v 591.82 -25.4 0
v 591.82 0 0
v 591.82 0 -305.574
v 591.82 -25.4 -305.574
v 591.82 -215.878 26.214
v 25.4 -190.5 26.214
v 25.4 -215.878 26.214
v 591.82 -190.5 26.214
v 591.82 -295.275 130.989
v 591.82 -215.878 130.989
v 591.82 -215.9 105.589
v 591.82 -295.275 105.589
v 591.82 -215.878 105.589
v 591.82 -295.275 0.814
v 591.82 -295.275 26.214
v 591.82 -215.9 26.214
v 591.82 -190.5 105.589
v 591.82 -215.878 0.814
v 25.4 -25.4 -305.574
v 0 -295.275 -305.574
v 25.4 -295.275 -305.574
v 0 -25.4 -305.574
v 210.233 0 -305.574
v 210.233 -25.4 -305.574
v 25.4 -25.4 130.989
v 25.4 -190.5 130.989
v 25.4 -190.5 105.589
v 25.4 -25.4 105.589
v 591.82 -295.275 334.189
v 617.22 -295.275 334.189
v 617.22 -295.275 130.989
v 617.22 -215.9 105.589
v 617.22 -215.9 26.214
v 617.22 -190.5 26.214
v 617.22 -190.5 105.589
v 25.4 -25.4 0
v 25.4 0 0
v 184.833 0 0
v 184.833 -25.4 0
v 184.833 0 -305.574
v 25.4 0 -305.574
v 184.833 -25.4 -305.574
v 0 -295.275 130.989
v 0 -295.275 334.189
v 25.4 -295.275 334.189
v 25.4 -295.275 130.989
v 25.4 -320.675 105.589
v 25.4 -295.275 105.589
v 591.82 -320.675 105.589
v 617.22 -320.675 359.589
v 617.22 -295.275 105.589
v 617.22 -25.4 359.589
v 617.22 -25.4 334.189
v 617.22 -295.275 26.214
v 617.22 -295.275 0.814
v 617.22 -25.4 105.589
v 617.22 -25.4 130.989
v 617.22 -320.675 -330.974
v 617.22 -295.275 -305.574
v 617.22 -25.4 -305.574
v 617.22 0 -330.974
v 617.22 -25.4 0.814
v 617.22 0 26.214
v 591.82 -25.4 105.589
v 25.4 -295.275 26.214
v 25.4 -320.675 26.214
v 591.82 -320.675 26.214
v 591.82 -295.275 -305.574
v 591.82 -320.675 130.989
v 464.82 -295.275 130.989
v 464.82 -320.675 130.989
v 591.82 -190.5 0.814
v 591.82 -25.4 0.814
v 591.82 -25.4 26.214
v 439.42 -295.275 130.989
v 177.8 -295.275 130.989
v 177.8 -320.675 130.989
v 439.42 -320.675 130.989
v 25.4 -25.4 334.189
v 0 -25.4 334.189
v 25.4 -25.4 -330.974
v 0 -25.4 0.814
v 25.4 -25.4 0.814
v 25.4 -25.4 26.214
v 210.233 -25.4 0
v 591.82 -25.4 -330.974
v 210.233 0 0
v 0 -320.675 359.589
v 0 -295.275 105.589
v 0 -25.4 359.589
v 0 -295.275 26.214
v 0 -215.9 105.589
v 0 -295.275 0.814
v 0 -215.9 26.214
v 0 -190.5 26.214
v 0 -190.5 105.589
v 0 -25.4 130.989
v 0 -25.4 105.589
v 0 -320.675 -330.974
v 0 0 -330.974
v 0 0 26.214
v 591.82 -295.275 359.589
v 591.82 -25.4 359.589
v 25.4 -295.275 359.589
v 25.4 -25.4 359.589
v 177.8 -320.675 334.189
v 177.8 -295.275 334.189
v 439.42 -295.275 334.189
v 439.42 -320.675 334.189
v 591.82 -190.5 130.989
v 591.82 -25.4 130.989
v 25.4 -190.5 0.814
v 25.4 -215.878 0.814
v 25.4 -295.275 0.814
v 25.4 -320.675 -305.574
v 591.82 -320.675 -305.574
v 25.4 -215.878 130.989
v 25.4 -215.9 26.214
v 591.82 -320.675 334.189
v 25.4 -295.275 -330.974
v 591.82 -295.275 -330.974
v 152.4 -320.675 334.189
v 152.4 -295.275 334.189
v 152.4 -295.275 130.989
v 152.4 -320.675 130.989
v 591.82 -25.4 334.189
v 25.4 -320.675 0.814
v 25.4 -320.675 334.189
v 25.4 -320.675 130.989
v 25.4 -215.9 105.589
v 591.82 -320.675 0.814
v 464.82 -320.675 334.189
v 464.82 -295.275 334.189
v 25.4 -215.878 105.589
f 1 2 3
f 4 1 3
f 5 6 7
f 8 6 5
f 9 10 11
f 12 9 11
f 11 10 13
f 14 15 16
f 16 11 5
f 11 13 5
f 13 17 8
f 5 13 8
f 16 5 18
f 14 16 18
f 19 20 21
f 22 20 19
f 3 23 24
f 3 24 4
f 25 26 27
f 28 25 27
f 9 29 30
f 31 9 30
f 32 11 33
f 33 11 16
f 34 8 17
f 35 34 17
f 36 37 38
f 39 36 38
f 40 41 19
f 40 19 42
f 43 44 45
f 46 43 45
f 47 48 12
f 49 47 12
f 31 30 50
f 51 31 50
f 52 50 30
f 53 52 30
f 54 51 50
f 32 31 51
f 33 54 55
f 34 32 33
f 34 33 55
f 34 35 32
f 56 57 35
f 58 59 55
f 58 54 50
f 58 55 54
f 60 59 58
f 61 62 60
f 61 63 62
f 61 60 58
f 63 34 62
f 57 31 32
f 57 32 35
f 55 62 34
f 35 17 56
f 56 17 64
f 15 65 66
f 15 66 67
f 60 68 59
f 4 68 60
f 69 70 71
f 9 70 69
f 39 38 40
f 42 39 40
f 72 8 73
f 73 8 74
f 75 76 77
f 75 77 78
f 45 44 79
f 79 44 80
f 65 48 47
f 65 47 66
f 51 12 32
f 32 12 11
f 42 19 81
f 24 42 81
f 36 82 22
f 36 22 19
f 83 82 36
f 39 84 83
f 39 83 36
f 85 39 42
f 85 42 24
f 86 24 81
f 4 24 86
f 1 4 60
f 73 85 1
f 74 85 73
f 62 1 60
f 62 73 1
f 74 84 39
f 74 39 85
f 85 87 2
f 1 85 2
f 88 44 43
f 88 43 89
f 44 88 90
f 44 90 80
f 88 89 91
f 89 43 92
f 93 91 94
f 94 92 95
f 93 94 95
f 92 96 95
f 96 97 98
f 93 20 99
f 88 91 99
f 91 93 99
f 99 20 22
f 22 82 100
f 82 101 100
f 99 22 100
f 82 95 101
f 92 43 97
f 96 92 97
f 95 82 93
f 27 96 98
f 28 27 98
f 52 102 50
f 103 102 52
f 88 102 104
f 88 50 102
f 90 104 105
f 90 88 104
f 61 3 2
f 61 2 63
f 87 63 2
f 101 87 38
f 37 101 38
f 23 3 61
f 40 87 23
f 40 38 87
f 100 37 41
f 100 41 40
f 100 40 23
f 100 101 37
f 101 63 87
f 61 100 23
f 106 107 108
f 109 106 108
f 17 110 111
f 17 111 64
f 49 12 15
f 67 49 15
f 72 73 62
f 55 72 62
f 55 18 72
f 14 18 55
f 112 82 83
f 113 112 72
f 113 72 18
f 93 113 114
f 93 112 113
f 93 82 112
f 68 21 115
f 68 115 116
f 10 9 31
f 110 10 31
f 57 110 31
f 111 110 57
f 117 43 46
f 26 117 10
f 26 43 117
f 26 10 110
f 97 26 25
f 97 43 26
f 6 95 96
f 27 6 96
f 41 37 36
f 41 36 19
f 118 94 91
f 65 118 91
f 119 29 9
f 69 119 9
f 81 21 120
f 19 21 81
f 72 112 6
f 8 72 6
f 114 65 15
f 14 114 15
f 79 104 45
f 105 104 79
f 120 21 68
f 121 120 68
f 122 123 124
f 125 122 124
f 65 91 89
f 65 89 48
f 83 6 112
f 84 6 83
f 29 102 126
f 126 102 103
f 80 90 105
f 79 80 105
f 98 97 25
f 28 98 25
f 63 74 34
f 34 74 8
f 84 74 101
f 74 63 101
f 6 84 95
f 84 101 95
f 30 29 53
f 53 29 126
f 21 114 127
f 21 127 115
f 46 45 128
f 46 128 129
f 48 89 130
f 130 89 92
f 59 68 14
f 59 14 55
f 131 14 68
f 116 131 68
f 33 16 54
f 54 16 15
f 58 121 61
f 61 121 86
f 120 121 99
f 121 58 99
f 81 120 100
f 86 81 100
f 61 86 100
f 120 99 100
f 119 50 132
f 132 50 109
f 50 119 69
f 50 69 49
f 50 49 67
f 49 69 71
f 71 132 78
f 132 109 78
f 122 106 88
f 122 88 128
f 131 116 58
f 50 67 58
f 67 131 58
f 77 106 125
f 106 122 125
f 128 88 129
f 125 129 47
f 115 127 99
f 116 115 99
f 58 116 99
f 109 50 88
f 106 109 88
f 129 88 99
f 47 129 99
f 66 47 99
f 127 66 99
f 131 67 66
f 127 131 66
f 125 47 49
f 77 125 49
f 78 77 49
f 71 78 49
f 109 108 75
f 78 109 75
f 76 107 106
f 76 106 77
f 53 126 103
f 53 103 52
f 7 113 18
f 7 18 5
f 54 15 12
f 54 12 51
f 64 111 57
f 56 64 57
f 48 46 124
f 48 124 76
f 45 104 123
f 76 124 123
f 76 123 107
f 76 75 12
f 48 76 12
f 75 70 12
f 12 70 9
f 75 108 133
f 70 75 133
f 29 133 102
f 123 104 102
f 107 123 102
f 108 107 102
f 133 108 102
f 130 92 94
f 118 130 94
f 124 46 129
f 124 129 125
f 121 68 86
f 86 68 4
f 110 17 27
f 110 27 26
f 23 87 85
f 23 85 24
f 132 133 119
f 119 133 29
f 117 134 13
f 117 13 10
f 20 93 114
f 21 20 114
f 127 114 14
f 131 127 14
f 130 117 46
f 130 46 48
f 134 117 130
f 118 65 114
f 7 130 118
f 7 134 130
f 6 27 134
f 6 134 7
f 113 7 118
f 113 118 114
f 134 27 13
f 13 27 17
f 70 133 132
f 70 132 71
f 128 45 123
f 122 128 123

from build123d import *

# Parameters (mm, degrees)
SKETCH1_W           = 690.5625
SKETCH1_H           = 320.675
SKETCH1_W_2         = 639.7625
SKETCH1_H_2         = 269.875
SKETCH1_W_3         = 25.4
SKETCH1_W_4         = 79.375
SKETCH1_H_3         = 25.4
BOSS_EXTRUDE1_DEPTH = 617.22
SKETCH2_W           = 566.42
SKETCH2_H           = 269.875
CUT_EXTRUDE1_DEPTH  = 981.137516082
BOSS_EXTRUDE2_DEPTH = 566.42
CUT_EXTRUDE2_REACH  = 741.293
SKETCH6_W           = 566.42
SKETCH6_H           = 79.375
SKETCH7_W           = 127
SKETCH7_H           = 203.2
SKETCH7_W_2         = 261.62
CUT_EXTRUDE3_DEPTH  = 773.950070043
CUT_EXTRUDE4_REACH  = 785.005
SKETCH8_W           = 566.42
SKETCH8_H           = 307.975
CUT_EXTRUDE6_REACH  = 785.005
SKETCH9_W           = 159.433185108
SKETCH9_H           = 305.57390625
SKETCH9_W_2         = 381.586814892
CUT_EXTRUDE8_REACH  = 774.95
SKETCH10_W          = 566.42
SKETCH10_H          = 306.3875
CUT_EXTRUDE10_REACH = 774.95
SKETCH12_W          = 566.42
SKETCH12_H          = 79.375
SKETCH13_W          = 617.22
SKETCH13_H          = 333.375
CUT_EXTRUDE13_DEPTH = 25.4


with BuildPart() as part:
    # Sketch1 → Boss-Extrude1 (new body)
    # profile 1 of 4: a face of its own
    with BuildSketch(Plane(origin=(0, 0, 0), x_dir=(0, 0, -1), z_dir=(1, 0, 0))):
        with Locations((-14.30734375, -160.3375)):
            Rectangle(SKETCH1_W, SKETCH1_H)
        with Locations((-14.30734375, -160.3375)):
            Rectangle(SKETCH1_W_2, SKETCH1_H_2, mode=Mode.SUBTRACT)
    # profile 2 of 4: a face of its own
    with BuildSketch(Plane(origin=(0, 0, 0), x_dir=(0, 0, -1), z_dir=(1, 0, 0))):
        Polygon((-0.81359375, -25.4), (-26.21359375, -25.4), (-26.21359375, -190.5), (-26.21359375, -215.9), (-26.21359375, -295.275), (-0.81359375, -295.275), align=None)
    # profile 3 of 4: a face of its own
    with BuildSketch(Plane(origin=(0, 0, 0), x_dir=(0, 0, -1), z_dir=(1, 0, 0))):
        with Locations((-118.28859375, -160.3375)):
            Rectangle(SKETCH1_W_3, SKETCH1_H_2)
    # profile 4 of 4: a face of its own
    with BuildSketch(Plane(origin=(0, 0, 0), x_dir=(0, 0, -1), z_dir=(1, 0, 0))):
        with Locations((-65.90109375, -203.2)):
            Rectangle(SKETCH1_W_4, SKETCH1_H_3)
    extrude(amount=BOSS_EXTRUDE1_DEPTH)

    # Sketch2 → Cut-Extrude1 (cut, through all)
    with BuildSketch(Plane.XY.offset(359.58859375)):
        with Locations((308.61, -160.3375)):
            Rectangle(SKETCH2_W, SKETCH2_H)
    extrude(amount=-CUT_EXTRUDE1_DEPTH, mode=Mode.SUBTRACT)

    # Sketch4 → Boss-Extrude2 (add)
    with BuildSketch(Plane(origin=(25.4, 0, 0), x_dir=(0, 0, -1), z_dir=(1, 0, 0))):
        Polygon((-26.21359375, -190.5), (-0.81359375, -190.5), (-0.81359375, -215.87774991), (-130.98859375, -215.87774991), (-130.98859375, -190.5), align=None)
    extrude(amount=BOSS_EXTRUDE2_DEPTH)

    # Sketch6 → Cut-Extrude2 (cut, up to next)
    with BuildSketch(Plane(origin=(0, -190.5, 0), x_dir=(1, 0, 0), z_dir=(0, 1, 0)), mode=Mode.PRIVATE) as cut_extrude2_sk1:
        with Locations((308.61, -65.90109375)):
            Rectangle(SKETCH6_W, SKETCH6_H)
    cut_extrude2_tool1 = extrude(cut_extrude2_sk1.sketch, amount=-CUT_EXTRUDE2_REACH, mode=Mode.PRIVATE) & part.part
    add(cut_extrude2_tool1.solids().sort_by_distance((308.61, -190.5, 65.901094))[0], mode=Mode.SUBTRACT)

    # Sketch7 → Cut-Extrude3 (cut, through all)
    with BuildSketch(Plane(origin=(0, -295.275, 0), x_dir=(1, 0, 0), z_dir=(0, 1, 0))):
        with Locations((528.32, -232.58859375)):
            Rectangle(SKETCH7_W, SKETCH7_H)
        with Locations((88.9, -232.58859375)):
            Rectangle(SKETCH7_W, SKETCH7_H)
        with Locations((308.61, -232.58859375)):
            Rectangle(SKETCH7_W_2, SKETCH7_H)
    extrude(amount=-CUT_EXTRUDE3_DEPTH, mode=Mode.SUBTRACT)

    # Sketch8 → Cut-Extrude4 (cut, up to next)
    with BuildSketch(Plane(origin=(0, 0, 0), x_dir=(1, 0, 0), z_dir=(0, 1, 0)), mode=Mode.PRIVATE) as cut_extrude4_sk1:
        with Locations((308.61, -180.20109375)):
            Rectangle(SKETCH8_W, SKETCH8_H)
    cut_extrude4_tool1 = extrude(cut_extrude4_sk1.sketch, amount=-CUT_EXTRUDE4_REACH, mode=Mode.PRIVATE) & part.part
    add(cut_extrude4_tool1.solids().sort_by_distance((308.61, 0, 180.201094))[0], mode=Mode.SUBTRACT)

    # Sketch9 → Cut-Extrude6 (cut, up to next)
    with BuildSketch(Plane(origin=(0, 0, 0), x_dir=(1, 0, 0), z_dir=(0, 1, 0)), mode=Mode.PRIVATE) as cut_extrude6_sk1:
        with Locations((105.116592554, 152.786953125)):
            Rectangle(SKETCH9_W, SKETCH9_H)
    cut_extrude6_tool1 = extrude(cut_extrude6_sk1.sketch, amount=-CUT_EXTRUDE6_REACH, mode=Mode.PRIVATE) & part.part
    # Sketch9 → Cut-Extrude6 (cut, up to next)
    with BuildSketch(Plane(origin=(0, 0, 0), x_dir=(1, 0, 0), z_dir=(0, 1, 0)), mode=Mode.PRIVATE) as cut_extrude6_sk2:
        with Locations((401.026592554, 152.786953125)):
            Rectangle(SKETCH9_W_2, SKETCH9_H)
    cut_extrude6_tool2 = extrude(cut_extrude6_sk2.sketch, amount=-CUT_EXTRUDE6_REACH, mode=Mode.PRIVATE) & part.part
    add(cut_extrude6_tool1.solids().sort_by_distance((105.116593, 0, -152.786953))[0], mode=Mode.SUBTRACT)
    add(cut_extrude6_tool2.solids().sort_by_distance((401.026593, 0, -152.786953))[0], mode=Mode.SUBTRACT)

    # Sketch10 → Cut-Extrude8 (cut, up to next)
    with BuildSketch(Plane(origin=(0, -295.275, 0), x_dir=(1, 0, 0), z_dir=(0, 1, 0)), mode=Mode.PRIVATE) as cut_extrude8_sk1:
        with Locations((308.61, 152.38015625)):
            Rectangle(SKETCH10_W, SKETCH10_H)
    cut_extrude8_tool1 = extrude(cut_extrude8_sk1.sketch, amount=-CUT_EXTRUDE8_REACH, mode=Mode.PRIVATE) & part.part
    add(cut_extrude8_tool1.solids().sort_by_distance((308.61, -295.275, -152.380156))[0], mode=Mode.SUBTRACT)

    # Sketch12 → Cut-Extrude10 (cut, up to next)
    with BuildSketch(Plane(origin=(0, -295.275, 0), x_dir=(1, 0, 0), z_dir=(0, 1, 0)), mode=Mode.PRIVATE) as cut_extrude10_sk1:
        with Locations((308.61, -65.90109375)):
            Rectangle(SKETCH12_W, SKETCH12_H)
    cut_extrude10_tool1 = extrude(cut_extrude10_sk1.sketch, amount=-CUT_EXTRUDE10_REACH, mode=Mode.PRIVATE) & part.part
    add(cut_extrude10_tool1.solids().sort_by_distance((308.61, -295.275, 65.901094))[0], mode=Mode.SUBTRACT)

    # Sketch13 → Cut-Extrude13 (cut)
    with BuildSketch(Plane(origin=(0, 0, 0), x_dir=(1, 0, 0), z_dir=(0, 1, 0))):
        with Locations((308.61, -192.90109375)):
            Rectangle(SKETCH13_W, SKETCH13_H)
    extrude(amount=-CUT_EXTRUDE13_DEPTH, mode=Mode.SUBTRACT)


solid = part.part
